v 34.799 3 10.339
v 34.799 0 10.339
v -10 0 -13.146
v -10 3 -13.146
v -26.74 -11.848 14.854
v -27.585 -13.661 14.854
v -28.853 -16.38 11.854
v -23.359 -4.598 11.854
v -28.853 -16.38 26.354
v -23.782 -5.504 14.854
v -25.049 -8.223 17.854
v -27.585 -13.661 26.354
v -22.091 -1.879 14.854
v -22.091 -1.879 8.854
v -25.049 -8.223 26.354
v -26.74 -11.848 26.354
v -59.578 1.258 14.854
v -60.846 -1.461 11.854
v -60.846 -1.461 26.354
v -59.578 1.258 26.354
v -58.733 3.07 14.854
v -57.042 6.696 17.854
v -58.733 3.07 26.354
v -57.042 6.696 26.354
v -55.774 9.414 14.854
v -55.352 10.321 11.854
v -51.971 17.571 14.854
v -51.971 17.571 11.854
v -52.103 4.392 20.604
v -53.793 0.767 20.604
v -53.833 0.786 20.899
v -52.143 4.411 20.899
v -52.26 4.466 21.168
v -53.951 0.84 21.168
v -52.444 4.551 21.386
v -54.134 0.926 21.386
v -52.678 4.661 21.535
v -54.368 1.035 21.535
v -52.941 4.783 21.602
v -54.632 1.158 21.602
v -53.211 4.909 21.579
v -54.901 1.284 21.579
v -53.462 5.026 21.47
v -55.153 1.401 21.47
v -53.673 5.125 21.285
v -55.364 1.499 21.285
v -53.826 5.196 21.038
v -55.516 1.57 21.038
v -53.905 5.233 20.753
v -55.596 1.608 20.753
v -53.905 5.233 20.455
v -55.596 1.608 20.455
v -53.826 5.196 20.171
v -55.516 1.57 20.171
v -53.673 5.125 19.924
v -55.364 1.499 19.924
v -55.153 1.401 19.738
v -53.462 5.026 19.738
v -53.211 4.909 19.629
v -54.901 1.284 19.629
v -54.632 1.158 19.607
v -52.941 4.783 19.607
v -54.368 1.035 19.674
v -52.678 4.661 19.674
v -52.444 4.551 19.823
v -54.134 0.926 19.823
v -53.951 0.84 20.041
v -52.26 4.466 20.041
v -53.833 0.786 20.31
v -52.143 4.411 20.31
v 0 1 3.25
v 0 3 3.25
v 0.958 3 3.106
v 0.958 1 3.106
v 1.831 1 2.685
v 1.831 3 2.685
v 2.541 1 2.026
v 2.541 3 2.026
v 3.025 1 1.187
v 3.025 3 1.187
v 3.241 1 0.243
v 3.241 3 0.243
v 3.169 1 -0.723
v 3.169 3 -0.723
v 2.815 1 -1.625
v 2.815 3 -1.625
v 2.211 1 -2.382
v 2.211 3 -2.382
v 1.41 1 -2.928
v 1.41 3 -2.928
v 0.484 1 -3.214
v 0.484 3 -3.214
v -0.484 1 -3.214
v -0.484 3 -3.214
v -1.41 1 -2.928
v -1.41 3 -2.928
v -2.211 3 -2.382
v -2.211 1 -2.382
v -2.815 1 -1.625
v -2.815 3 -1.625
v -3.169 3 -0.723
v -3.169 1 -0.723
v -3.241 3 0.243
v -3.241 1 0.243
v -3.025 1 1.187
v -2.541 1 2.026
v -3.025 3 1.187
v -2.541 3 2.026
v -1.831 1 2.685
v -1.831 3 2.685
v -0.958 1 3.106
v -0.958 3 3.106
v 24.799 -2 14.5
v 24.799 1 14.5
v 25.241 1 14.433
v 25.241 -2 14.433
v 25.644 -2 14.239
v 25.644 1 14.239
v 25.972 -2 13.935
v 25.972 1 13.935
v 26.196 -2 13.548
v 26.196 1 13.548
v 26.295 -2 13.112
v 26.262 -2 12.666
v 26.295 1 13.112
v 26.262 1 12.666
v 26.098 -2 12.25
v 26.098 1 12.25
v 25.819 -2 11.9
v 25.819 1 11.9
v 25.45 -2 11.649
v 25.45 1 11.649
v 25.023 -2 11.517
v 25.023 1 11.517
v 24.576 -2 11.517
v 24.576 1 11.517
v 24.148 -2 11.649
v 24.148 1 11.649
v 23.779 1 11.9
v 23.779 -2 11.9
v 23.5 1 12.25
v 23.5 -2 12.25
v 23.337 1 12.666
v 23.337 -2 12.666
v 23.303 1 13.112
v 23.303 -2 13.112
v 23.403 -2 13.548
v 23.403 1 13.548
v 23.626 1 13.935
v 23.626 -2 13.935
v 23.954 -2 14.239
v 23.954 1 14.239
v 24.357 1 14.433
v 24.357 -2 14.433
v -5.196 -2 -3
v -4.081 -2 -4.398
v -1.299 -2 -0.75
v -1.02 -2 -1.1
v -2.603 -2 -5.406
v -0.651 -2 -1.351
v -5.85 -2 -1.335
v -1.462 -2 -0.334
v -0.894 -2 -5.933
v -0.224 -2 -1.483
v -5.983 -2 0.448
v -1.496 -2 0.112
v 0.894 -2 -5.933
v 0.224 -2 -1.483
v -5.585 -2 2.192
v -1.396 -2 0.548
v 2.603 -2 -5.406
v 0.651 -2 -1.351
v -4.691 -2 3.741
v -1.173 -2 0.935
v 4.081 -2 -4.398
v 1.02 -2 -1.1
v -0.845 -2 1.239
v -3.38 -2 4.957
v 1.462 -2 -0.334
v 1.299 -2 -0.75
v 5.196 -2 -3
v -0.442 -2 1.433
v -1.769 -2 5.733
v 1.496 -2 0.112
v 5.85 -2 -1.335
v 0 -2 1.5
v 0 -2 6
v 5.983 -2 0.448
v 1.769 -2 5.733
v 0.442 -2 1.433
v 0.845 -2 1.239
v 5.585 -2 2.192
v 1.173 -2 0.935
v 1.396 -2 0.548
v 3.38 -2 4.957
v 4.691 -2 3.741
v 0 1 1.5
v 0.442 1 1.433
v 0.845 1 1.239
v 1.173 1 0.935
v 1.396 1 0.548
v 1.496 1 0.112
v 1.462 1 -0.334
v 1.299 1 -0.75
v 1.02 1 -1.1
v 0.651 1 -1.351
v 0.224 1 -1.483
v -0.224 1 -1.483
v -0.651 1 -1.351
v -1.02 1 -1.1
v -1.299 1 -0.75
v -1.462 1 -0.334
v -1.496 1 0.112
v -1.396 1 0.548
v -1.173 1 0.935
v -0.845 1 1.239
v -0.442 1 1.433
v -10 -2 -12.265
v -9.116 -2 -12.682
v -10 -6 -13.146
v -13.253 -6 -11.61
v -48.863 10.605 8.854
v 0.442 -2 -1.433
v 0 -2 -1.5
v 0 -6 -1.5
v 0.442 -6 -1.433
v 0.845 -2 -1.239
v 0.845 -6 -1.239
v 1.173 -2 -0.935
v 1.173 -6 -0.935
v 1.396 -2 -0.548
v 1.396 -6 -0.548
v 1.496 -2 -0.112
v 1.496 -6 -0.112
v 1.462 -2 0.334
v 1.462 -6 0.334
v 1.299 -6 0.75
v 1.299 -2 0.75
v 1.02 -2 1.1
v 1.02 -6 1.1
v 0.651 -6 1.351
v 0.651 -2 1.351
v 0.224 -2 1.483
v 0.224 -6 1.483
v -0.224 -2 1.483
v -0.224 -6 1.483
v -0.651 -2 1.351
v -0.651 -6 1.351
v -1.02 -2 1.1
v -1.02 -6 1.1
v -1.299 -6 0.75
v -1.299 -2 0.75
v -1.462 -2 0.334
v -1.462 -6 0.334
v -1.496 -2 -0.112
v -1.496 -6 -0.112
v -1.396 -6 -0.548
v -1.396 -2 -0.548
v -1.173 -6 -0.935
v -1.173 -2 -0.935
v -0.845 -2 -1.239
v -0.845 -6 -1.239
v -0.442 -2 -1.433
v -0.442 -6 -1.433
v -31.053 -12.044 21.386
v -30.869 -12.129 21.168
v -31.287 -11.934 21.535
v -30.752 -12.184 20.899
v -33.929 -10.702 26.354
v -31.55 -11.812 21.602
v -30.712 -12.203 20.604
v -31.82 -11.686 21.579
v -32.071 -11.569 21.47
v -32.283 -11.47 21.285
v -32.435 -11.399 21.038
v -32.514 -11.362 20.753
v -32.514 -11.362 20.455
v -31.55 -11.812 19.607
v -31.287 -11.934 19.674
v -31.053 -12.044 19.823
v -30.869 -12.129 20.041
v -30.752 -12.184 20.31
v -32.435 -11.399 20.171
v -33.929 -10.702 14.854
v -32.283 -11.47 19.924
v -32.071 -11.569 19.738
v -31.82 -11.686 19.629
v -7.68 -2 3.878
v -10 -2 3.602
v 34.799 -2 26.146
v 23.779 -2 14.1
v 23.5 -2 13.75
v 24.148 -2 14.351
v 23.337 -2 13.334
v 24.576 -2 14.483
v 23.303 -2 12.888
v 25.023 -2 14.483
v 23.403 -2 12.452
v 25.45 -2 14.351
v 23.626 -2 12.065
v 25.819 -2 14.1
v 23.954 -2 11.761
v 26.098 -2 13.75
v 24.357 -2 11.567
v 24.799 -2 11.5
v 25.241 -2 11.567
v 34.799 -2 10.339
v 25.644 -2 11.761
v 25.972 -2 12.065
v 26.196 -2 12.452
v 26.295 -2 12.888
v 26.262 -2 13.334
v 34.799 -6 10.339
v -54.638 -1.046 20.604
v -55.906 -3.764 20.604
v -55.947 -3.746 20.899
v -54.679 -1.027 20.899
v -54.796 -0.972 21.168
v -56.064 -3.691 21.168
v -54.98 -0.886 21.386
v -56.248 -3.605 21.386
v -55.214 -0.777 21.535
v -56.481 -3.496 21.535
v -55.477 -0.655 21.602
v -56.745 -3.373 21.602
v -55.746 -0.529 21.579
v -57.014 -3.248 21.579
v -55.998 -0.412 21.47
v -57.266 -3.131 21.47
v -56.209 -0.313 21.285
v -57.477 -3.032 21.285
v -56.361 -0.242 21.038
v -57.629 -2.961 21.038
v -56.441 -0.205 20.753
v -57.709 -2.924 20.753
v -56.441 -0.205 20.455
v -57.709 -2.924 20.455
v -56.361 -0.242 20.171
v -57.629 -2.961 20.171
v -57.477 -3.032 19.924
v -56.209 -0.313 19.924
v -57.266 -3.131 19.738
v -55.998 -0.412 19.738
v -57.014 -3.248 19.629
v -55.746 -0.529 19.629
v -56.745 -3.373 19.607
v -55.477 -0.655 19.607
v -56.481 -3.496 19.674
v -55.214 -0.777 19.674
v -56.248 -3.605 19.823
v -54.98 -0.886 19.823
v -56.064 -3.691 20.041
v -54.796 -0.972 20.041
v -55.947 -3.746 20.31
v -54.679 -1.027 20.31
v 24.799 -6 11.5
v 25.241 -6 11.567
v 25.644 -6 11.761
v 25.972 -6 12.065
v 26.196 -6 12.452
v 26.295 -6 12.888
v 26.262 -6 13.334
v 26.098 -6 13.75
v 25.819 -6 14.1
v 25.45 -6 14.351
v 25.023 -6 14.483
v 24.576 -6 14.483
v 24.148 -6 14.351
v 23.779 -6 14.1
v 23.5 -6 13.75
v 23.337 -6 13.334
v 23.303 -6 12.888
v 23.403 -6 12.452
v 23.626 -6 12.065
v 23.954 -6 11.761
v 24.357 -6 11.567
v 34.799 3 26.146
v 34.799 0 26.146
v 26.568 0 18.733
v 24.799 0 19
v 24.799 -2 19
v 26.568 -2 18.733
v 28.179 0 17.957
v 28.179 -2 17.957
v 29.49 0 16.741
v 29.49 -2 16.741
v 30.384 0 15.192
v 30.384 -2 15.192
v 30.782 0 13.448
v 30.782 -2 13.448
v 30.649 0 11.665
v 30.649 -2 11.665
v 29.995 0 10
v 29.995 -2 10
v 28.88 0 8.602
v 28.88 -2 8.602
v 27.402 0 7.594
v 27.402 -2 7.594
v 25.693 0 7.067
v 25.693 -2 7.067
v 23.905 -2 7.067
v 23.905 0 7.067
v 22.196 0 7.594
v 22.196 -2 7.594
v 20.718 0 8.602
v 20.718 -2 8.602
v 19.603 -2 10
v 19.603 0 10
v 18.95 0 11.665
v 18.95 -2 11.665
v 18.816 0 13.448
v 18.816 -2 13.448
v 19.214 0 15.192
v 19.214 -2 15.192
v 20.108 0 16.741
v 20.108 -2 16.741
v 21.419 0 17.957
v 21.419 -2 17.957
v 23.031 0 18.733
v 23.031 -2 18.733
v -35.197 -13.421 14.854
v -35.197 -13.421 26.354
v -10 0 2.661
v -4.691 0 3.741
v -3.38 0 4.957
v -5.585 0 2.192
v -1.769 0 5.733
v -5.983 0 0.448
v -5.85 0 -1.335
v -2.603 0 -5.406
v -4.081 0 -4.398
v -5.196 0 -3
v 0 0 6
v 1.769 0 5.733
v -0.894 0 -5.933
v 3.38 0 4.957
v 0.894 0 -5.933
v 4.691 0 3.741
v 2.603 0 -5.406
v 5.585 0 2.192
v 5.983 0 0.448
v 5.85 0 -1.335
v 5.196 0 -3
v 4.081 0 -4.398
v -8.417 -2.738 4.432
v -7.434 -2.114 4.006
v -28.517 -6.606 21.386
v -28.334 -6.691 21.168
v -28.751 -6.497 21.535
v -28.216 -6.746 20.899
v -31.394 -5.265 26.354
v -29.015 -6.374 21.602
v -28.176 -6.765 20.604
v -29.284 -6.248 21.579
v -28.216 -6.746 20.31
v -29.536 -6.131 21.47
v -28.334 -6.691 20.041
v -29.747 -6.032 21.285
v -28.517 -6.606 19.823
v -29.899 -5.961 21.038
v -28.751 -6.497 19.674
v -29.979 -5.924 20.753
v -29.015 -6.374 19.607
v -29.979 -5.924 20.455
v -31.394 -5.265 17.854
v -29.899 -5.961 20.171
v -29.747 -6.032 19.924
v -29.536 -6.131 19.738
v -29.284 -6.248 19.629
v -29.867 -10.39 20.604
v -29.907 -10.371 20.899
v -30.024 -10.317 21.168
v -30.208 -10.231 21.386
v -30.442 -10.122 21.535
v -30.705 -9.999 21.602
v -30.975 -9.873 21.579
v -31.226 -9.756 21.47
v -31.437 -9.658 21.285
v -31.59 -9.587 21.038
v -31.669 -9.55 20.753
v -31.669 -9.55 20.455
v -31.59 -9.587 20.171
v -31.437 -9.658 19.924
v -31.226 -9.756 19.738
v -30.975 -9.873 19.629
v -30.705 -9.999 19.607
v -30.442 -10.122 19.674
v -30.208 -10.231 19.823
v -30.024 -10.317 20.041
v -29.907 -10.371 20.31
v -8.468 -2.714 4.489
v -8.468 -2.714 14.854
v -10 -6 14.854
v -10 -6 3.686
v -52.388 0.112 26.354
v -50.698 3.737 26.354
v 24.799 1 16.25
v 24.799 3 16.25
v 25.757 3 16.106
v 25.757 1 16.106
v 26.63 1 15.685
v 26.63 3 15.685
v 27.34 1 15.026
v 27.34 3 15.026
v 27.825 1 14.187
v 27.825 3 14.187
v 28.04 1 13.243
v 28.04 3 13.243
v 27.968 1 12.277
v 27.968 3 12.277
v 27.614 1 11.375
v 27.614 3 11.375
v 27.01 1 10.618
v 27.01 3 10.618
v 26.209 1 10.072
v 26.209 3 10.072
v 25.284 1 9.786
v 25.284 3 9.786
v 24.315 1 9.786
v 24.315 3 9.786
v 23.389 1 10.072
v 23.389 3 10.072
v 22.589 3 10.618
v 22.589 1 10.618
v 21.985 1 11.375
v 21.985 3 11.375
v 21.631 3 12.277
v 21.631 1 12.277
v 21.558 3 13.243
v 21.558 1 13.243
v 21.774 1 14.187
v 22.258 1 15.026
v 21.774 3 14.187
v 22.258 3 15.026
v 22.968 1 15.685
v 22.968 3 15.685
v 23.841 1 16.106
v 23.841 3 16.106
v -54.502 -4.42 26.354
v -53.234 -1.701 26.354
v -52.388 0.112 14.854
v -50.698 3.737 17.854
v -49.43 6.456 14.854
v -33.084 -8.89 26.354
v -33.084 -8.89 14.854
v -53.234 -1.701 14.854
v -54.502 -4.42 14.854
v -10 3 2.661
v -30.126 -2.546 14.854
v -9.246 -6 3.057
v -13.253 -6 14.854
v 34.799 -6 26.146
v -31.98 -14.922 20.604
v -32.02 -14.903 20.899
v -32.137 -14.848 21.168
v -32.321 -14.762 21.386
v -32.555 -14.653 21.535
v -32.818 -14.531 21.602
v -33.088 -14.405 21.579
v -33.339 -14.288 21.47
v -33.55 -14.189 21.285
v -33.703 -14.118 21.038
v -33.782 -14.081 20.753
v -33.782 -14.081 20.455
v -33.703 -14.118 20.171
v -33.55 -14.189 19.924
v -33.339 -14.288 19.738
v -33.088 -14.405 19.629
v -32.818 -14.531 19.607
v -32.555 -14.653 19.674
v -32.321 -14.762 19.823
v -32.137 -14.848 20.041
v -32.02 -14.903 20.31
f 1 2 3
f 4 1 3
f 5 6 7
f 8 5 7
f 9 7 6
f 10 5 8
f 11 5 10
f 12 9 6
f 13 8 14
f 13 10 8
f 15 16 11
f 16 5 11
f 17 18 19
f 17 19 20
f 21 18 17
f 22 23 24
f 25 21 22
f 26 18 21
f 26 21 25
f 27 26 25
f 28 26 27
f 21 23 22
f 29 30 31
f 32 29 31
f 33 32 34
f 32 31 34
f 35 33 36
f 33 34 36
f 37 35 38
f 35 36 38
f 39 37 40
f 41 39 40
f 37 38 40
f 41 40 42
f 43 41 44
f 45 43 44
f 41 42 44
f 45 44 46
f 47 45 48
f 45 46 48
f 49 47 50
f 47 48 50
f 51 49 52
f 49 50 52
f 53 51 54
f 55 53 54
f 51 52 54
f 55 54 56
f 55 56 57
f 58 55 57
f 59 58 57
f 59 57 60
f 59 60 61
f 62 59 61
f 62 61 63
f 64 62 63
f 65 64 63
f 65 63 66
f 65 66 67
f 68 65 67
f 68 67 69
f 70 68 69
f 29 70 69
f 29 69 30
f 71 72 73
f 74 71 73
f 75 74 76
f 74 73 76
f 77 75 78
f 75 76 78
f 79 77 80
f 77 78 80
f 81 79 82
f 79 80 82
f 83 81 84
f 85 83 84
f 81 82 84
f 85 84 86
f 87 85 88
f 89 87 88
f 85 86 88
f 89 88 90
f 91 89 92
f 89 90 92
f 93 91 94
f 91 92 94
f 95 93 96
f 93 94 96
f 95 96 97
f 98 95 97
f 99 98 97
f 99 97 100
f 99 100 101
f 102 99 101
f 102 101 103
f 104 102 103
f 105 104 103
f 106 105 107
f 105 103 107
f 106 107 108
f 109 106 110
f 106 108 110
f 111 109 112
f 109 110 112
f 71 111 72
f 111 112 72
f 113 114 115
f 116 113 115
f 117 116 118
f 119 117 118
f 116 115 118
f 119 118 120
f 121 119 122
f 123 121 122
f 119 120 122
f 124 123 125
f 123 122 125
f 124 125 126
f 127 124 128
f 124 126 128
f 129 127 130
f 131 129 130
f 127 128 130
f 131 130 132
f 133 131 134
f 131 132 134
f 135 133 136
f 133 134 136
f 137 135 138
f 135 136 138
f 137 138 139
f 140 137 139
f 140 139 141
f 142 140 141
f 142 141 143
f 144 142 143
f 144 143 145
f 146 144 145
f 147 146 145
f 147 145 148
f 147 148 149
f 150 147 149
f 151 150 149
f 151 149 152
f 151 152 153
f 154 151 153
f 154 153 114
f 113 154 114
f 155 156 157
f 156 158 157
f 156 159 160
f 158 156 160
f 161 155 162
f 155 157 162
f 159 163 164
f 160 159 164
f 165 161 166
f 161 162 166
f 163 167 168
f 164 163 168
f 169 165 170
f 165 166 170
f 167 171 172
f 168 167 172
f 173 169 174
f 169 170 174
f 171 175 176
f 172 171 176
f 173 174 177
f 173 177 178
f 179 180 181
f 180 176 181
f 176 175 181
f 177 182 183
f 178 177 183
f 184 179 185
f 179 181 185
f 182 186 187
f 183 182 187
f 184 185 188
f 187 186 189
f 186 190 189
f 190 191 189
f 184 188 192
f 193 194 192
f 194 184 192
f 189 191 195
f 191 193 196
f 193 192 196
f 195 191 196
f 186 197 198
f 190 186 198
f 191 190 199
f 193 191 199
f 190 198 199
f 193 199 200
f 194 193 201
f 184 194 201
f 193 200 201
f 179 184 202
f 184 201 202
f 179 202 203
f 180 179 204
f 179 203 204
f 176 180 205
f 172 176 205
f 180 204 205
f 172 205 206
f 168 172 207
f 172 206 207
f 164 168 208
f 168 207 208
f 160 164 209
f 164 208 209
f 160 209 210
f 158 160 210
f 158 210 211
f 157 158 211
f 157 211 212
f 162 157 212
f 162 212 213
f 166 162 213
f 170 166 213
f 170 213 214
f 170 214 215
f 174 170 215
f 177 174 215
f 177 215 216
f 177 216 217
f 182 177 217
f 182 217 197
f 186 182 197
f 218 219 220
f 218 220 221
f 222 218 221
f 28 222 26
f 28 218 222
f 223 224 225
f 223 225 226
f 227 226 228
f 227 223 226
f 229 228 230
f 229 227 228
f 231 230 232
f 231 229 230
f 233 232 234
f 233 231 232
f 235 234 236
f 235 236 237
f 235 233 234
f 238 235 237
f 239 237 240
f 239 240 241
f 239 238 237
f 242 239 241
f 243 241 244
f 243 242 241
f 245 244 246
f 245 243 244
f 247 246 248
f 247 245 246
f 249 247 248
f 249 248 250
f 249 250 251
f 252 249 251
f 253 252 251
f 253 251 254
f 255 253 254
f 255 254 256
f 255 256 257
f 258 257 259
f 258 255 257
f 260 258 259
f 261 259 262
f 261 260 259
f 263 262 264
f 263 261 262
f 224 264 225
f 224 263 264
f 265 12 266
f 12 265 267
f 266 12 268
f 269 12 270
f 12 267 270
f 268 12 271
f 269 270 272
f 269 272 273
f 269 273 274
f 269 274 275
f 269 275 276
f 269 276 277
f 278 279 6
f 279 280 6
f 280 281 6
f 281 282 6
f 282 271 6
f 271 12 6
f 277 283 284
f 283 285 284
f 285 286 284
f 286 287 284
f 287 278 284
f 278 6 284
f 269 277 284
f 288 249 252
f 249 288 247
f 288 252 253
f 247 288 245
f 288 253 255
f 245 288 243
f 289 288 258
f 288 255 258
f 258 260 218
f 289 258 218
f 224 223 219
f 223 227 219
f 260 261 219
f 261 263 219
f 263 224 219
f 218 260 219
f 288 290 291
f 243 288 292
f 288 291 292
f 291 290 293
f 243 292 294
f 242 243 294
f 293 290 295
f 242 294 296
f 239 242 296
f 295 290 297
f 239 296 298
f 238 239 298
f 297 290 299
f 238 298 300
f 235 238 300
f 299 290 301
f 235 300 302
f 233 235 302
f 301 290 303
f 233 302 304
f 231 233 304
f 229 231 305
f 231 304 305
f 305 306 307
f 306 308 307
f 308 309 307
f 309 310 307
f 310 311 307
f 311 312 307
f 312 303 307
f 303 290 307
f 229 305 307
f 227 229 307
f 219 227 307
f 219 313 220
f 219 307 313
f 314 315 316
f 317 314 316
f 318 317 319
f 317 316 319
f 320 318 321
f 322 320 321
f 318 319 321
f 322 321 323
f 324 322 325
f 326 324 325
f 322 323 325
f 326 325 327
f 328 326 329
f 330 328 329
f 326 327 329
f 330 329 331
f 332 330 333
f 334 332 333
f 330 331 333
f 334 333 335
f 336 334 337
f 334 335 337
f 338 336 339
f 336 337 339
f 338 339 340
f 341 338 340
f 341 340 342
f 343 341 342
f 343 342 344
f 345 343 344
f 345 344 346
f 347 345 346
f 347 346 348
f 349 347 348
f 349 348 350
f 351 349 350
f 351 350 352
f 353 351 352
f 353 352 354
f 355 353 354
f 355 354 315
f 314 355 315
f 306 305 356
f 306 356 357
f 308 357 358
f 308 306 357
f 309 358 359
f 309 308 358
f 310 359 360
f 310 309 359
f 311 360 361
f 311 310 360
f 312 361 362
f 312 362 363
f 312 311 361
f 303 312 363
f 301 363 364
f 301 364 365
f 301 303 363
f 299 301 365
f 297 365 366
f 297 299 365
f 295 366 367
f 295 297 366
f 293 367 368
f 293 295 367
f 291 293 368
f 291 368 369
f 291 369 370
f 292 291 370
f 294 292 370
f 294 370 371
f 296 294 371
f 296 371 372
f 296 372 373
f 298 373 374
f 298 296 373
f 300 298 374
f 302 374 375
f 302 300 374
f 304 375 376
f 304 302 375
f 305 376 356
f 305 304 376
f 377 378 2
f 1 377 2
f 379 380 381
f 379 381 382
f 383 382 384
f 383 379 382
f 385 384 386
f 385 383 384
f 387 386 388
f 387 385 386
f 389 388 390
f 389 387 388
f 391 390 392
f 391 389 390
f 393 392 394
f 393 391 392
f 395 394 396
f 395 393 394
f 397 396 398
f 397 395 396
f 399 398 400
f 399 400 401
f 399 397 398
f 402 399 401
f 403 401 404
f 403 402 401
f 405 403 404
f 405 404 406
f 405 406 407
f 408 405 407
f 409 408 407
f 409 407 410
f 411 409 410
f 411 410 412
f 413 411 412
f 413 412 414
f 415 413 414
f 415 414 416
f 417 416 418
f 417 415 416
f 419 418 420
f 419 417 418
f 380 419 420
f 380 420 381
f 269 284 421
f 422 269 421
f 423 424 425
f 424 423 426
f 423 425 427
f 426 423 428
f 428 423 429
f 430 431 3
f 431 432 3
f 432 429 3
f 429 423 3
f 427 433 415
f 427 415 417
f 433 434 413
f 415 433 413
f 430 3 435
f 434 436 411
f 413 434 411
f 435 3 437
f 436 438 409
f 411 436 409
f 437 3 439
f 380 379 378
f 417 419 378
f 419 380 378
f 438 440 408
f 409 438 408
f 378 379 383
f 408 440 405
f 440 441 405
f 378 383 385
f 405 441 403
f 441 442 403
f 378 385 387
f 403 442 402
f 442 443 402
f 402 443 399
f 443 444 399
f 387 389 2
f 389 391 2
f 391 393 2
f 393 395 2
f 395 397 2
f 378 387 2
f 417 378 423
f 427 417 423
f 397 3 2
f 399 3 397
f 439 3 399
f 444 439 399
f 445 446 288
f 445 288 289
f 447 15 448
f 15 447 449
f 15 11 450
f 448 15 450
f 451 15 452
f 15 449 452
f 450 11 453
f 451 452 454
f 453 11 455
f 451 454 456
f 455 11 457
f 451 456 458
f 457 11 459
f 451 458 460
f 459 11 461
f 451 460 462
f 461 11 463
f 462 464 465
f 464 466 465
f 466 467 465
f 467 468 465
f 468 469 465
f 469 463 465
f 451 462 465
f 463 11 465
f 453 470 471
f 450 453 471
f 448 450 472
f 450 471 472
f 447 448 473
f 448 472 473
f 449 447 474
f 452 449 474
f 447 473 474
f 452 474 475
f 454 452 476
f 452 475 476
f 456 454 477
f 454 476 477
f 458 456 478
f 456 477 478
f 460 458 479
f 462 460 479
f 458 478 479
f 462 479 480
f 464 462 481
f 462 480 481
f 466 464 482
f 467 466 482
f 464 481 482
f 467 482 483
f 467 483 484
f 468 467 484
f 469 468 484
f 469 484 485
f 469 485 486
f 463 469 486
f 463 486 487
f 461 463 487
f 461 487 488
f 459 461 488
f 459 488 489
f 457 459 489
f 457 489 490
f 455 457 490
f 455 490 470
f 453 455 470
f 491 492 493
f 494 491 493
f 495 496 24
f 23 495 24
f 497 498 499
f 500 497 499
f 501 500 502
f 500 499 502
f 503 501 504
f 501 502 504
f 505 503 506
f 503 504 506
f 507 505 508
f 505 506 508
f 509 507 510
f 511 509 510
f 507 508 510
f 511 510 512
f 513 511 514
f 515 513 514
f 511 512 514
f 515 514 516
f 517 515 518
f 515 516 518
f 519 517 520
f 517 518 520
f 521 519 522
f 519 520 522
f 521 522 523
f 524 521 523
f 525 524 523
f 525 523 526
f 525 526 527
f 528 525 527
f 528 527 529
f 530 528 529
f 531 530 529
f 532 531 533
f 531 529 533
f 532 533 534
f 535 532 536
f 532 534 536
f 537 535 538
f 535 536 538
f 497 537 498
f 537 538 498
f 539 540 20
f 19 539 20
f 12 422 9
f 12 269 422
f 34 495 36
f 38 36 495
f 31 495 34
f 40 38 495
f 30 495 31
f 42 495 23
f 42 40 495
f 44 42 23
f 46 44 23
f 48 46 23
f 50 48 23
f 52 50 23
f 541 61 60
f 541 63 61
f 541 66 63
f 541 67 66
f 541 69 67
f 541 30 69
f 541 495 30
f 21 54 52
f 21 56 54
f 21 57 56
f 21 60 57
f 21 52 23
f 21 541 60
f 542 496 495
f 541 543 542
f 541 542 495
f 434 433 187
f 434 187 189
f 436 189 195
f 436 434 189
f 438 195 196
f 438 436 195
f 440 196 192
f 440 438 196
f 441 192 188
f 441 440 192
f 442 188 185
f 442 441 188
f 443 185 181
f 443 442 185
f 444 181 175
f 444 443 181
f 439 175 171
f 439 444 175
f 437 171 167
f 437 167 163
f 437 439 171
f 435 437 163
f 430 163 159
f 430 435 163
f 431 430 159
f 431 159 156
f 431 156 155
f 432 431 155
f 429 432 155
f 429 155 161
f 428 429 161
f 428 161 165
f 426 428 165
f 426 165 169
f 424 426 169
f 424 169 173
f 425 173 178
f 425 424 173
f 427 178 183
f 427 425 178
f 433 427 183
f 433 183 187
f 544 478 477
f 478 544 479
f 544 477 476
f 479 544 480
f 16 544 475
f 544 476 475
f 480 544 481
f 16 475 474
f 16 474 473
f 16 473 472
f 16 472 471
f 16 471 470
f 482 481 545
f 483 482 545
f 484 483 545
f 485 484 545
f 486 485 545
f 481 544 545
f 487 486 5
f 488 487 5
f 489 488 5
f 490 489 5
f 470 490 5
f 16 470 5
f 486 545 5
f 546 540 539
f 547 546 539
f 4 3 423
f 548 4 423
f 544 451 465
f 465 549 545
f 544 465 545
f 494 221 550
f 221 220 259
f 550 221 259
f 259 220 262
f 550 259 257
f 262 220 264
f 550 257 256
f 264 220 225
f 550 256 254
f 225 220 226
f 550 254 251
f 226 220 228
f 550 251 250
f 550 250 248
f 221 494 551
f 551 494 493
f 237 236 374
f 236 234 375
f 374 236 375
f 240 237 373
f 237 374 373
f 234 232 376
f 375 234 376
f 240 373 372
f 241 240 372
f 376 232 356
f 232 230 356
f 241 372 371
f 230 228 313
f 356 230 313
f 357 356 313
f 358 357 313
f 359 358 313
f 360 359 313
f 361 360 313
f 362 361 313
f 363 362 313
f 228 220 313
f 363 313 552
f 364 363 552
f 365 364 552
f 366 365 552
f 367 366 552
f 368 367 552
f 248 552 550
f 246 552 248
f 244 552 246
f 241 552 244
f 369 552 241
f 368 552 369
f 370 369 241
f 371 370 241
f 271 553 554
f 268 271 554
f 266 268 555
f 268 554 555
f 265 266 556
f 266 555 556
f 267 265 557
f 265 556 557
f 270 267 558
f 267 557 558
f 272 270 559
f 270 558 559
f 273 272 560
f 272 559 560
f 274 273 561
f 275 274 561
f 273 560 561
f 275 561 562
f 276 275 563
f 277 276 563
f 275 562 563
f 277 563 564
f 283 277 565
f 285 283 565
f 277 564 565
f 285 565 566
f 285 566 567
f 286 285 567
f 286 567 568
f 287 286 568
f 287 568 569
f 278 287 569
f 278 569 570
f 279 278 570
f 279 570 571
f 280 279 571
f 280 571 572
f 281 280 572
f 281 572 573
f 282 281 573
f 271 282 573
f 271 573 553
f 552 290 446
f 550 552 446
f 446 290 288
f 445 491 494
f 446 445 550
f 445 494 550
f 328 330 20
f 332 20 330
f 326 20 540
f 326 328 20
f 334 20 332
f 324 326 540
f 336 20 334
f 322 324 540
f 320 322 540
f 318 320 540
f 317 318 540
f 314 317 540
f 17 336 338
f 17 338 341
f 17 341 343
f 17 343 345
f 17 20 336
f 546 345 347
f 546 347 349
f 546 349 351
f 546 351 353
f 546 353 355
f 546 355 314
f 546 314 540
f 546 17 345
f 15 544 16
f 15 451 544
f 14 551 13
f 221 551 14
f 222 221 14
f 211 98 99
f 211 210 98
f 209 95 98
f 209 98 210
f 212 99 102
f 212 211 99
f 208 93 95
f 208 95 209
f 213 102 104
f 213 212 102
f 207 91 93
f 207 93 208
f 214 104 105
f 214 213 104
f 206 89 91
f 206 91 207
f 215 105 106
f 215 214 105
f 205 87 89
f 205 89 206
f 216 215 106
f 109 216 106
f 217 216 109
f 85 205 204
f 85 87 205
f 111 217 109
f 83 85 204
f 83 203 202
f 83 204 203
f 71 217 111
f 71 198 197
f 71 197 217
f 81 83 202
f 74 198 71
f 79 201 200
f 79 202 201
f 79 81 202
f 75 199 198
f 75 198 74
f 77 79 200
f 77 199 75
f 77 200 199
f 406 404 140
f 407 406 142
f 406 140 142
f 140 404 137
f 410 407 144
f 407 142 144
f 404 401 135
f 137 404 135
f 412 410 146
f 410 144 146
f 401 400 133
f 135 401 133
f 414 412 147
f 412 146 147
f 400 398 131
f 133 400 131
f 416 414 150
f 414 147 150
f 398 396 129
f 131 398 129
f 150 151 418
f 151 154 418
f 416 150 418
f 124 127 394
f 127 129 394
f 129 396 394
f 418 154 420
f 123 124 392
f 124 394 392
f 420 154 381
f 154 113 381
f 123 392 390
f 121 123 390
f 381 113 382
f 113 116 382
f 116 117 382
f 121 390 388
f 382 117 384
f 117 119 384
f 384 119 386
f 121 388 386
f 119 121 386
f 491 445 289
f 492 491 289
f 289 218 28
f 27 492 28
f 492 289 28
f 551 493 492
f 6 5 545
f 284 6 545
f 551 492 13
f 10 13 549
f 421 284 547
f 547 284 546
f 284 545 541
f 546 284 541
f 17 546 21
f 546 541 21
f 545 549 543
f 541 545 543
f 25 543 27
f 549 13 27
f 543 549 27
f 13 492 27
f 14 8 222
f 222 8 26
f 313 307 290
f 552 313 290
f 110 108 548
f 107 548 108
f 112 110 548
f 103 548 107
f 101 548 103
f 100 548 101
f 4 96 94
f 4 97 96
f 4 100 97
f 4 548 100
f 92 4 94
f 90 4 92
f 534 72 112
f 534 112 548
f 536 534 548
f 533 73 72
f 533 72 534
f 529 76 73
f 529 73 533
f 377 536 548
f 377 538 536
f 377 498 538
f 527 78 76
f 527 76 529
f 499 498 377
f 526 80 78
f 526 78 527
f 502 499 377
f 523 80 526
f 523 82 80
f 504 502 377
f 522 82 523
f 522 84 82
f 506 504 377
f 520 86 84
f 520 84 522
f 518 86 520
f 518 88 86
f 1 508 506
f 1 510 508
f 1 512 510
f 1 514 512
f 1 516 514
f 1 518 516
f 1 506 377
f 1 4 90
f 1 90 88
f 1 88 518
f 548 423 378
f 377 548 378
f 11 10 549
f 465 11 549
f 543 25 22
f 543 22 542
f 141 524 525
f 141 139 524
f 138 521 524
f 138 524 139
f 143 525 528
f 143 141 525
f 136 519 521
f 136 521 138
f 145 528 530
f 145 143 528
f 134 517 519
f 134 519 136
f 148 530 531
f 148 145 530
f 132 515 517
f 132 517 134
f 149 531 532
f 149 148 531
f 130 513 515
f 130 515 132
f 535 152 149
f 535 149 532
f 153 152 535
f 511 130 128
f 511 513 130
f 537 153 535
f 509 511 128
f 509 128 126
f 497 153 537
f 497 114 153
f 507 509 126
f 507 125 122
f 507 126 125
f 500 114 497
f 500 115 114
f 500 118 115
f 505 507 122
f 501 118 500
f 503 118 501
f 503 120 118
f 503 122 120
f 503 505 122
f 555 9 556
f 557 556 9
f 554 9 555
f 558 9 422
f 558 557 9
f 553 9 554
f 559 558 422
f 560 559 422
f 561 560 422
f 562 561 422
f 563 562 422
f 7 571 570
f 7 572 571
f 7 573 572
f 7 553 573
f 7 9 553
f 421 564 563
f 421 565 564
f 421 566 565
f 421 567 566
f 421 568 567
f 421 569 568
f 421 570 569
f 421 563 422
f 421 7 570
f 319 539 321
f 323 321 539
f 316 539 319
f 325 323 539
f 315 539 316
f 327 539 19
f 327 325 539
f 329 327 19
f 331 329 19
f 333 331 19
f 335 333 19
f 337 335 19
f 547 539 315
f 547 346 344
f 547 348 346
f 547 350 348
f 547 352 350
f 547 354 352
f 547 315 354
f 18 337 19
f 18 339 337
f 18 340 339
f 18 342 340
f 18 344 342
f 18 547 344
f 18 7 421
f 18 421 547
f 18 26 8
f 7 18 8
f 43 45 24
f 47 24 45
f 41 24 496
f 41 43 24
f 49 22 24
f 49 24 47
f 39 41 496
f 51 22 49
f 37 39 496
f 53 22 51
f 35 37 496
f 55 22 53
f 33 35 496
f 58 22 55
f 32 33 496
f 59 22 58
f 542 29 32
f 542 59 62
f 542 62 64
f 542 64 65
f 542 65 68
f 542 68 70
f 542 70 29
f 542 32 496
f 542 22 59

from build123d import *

# Parameters (mm, degrees)
BOSS_EXTRUDE1_DEPTH  = 3
SKETCH1_R            = 6
SKETCH1_R_2          = 5.999999999999998
BOSS_EXTRUDE3_DEPTH  = 2
SKETCH4_R            = 1.5000000000000013
SKETCH4_R_2          = 1.5000000000000009
CUT_EXTRUDE1_DEPTH   = 44.812962496801305
SKETCH5_R            = 3.25
SKETCH5_R_2          = 3.2500000000000004
CUT_EXTRUDE2_DEPTH   = 2
SKETCH6_R            = 1.5000000000000013
SKETCH6_R_2          = 1.5000000000000009
BOSS_EXTRUDE4_DEPTH  = 4
BOSS_EXTRUDE9_DEPTH  = 5
BOSS_EXTRUDE10_DEPTH = 3
BOSS_EXTRUDE11_DEPTH = 11.5
SKETCH24_R           = 0.9999999999999983
CUT_EXTRUDE3_DEPTH   = 71.05142175706676
CUT_EXTRUDE4_DEPTH   = 71.37296543116399
CUT_EXTRUDE5_DEPTH   = 75.00527115702536
CHAMFER2_SIZE        = 1
CHAMFER2_SIZE_2      = 0.849779112
CHAMFER2_SIZE_3      = 0.753042781
CHAMFER3_SIZE        = 48
CHAMFER3_SIZE_2      = 25
CHAMFER4_SIZE        = 3
CHAMFER5_SIZE        = 3


with BuildPart() as part:
    # Sketch3 → Boss-Extrude1 (new body)
    with BuildSketch(Plane(origin=(0, 0, 0), x_dir=(1, 0, 0), z_dir=(0, 1, 0))):
        Polygon((-10, 13.145588768291844), (-9.999999999999998, -2.66137686720019), (34.79919353527449, -26.14558876829183), (34.79919353527449, -10.33862313279981), align=None)
    extrude(amount=BOSS_EXTRUDE1_DEPTH)

    # Sketch1 → Boss-Extrude3 (add)
    with BuildSketch(Plane(origin=(0, 0, 0), x_dir=(1, 0, 0), z_dir=(0, 1, 0))):
        with Locations(Location((0, 0, 0), (0, 0, 270))):
            Circle(SKETCH1_R)
        with Locations(Location((24.79919353527449, -13.000000000000002, 0), (0, 0, 270))):
            Circle(SKETCH1_R_2)
    extrude(amount=-BOSS_EXTRUDE3_DEPTH)

    # Sketch4 → Cut-Extrude1 (cut, through all)
    with BuildSketch(Plane(origin=(0, 3, 0), x_dir=(1, 0, 0), z_dir=(0, 1, 0))):
        with Locations(Location((0, 0, 0), (0, 0, 270))):
            Circle(SKETCH4_R)
        with Locations(Location((24.79919353527449, -13.000000000000002, 0), (0, 0, 270))):
            Circle(SKETCH4_R_2)
    extrude(amount=-CUT_EXTRUDE1_DEPTH, mode=Mode.SUBTRACT)

    # Sketch5 → Cut-Extrude2 (cut)
    with BuildSketch(Plane(origin=(0, 3, 0), x_dir=(1, 0, 0), z_dir=(0, 1, 0))):
        with Locations(Location((0, 0, 0), (0, 0, 270))):
            Circle(SKETCH5_R)
        with Locations(Location((24.79919353527449, -13.000000000000002, 0), (0, 0, 270))):
            Circle(SKETCH5_R_2)
    extrude(amount=-CUT_EXTRUDE2_DEPTH, mode=Mode.SUBTRACT)


with BuildPart() as body_2:
    # Sketch6 → Boss-Extrude4 (new body)
    with BuildSketch(Plane.XZ.offset(2)):
        Polygon((-9.999999999999998, 2.66137686720019), (-10, -13.145588768291844), (34.79919353527449, 10.33862313279981), (34.79919353527449, 26.14558876829183), align=None)
        with Locations(Location((0, 0, 0), (0, 0, 270))):
            Circle(SKETCH6_R, mode=Mode.SUBTRACT)
        with Locations(Location((24.79919353527449, 13.000000000000002, 0), (0, 0, 270))):
            Circle(SKETCH6_R_2, mode=Mode.SUBTRACT)
    extrude(amount=BOSS_EXTRUDE4_DEPTH)

    # Sketch19 → Boss-Extrude9 (add)
    with BuildSketch(Plane(origin=(-2.5521063946862226, -5.473009825281398, 2.8e-16), x_dir=(0.9063077870366528, -0.42261826174069356, 0), z_dir=(0.42261826174069356, 0.9063077870366528, 0))):
        Polygon((-6.527368299922367, 13.145588768291844), (-6.5273682999223634, -14.854411231708156), (-54.52736829992237, -14.854411231708161), (-54.52736829992237, 13.145588768291844), align=None)
    extrude(amount=-BOSS_EXTRUDE9_DEPTH)

    # Sketch22 → Boss-Extrude10 (add)
    with BuildSketch(Plane.XY.offset(14.854411231708154)):
        Polygon((-51.9706848915214, 17.571251782926392), (-60.84566838807596, -1.4612117448433186), (-28.85300350568211, -16.379636384289785), (-19.97802000912756, 2.652827143479914), align=None)
    extrude(amount=-BOSS_EXTRUDE10_DEPTH)

    # Sketch23 → Boss-Extrude11 (add)
    with BuildSketch(Plane.XY.offset(14.854411231708154)):
        Polygon((-58.73257707937249, 3.0703271903399454), (-57.04210403240972, 6.695558338486558), (-50.697949523153156, 3.737230506301715), (-52.38842257011593, 0.11199935815509857), align=None)
        Polygon((-60.84566838807596, -1.4612117448433186), (-59.57781360285388, 1.2577116162666404), (-53.23365909359731, -1.7006162159182072), (-54.501513878819395, -4.419539577028165), align=None)
        Polygon((-35.19715801493865, -13.421308552104925), (-28.85300350568211, -16.379636384289785), (-27.58514872046003, -13.6607130231798), (-33.92930322971659, -10.702385190994963), align=None)
        Polygon((-33.0840667062352, -8.88976961692166), (-26.73991219697864, -11.8480974491065), (-25.049439150015868, -8.222866300959888), (-31.393593659272426, -5.264538468775042), align=None)
    extrude(amount=BOSS_EXTRUDE11_DEPTH)

    # Sketch24 → Cut-Extrude3 (cut, through all)
    with BuildSketch(Plane(origin=(-11.42708989124078, -24.505473353051112, 0), x_dir=(0.9063077870366529, -0.4226182617406931, 0), z_dir=(-0.42261826174069306, -0.9063077870366528, 0))):
        with Locations((-50.077368299922384, 20.604411231708156)):
            Circle(SKETCH24_R)
        with Locations((-23.677368299922374, 20.60441123170816)):
            Circle(SKETCH24_R)
    extrude(amount=-CUT_EXTRUDE3_DEPTH, mode=Mode.SUBTRACT)

    # Sketch25 → Cut-Extrude4 (cut, through all)
    with BuildSketch(Plane.XZ.offset(5.999999999999999)):
        Polygon((-1.7598045547698953, -8.82599101058171), (-0.856014781659975, -22.343448840083095), (-19.416391366852192, -22.343448840083095), (-12.561706832548245, 28.592130084052375), (-0.856014781659975, 28.592130084052375), align=None)
    extrude(amount=CUT_EXTRUDE4_DEPTH, mode=Mode.SUBTRACT)

    # Sketch26 → Cut-Extrude5 (cut, through all)
    with BuildSketch(Plane(origin=(3.2500000000000018, 0, -6.1997983838186235), x_dir=(-0.8856854834026603, 0, -0.46428571428571436), z_dir=(0.4642857142857144, 0, -0.8856854834026604))):
        Polygon((-2.6471574670381415, -3.4708885976233637), (-2.0453444794839015, -11.294457435868079), (36.03300455139902, -14.522363460038978), (23.996744800257375, 7.088193820427202), align=None)
    extrude(amount=CUT_EXTRUDE5_DEPTH, mode=Mode.SUBTRACT)

    # Chamfer2
    # the kernel refuses this chamfer: 1, 0.849779112, 0.753042781 mm, written as the material it adds along each edge
    with BuildSketch(Plane(origin=(-6.36268787947312, -3.696106496901656, 4.568094418300827), x_dir=(0.33809036708449836, 0.9242749779914556, 0.17723055251158967), z_dir=(-0.8186169306793458, 0.38172734387111207, -0.4291276683531757))) as chamfer2_piece_1_section:
        Polygon((CHAMFER2_SIZE, -2e-17), (CHAMFER2_SIZE_2 * 0.196215621581, -CHAMFER2_SIZE_2 * 0.980560773459), (0, 0), align=None)
    chamfer2_piece_1 = extrude(amount=7.014923756891123, mode=Mode.PRIVATE)
    chamfer2_piece_1 = split(chamfer2_piece_1, bisect_by=Plane(origin=(-6.36268787947312, -2, 4.568094418300827), z_dir=(0, -1, 0)), keep=Keep.TOP, mode=Mode.PRIVATE)
    chamfer2_piece_1 = split(chamfer2_piece_1, bisect_by=Plane(origin=(-8.46791111376206, -2.714424780626905, 4.568094418300827), z_dir=(-0.9063077870366527, 0.4226182617406935, 0)), keep=Keep.TOP, mode=Mode.PRIVATE)
    add(chamfer2_piece_1)
    with BuildSketch(Plane(origin=(-11.061112191786581, -8.275562438723423, 2.1051306137240746), x_dir=(-0.09141088767312612, -0.19603128122495278, 0.9763277044087783), z_dir=(0.4126139173265195, 0.884853401205295, 0.21629658712953703))) as chamfer2_piece_2_section:
        Polygon((CHAMFER2_SIZE, 0), (CHAMFER2_SIZE_3 * 0.420785758249, CHAMFER2_SIZE_3 * 0.907160044076), (0, 0), align=None)
    chamfer2_piece_2 = extrude(amount=8.85649542189165, mode=Mode.PRIVATE)
    chamfer2_piece_2 = split(chamfer2_piece_2, bisect_by=Plane(origin=(-11.061112191786581, -6, 2.1051306137240746), z_dir=(0, 1, 0)), keep=Keep.TOP, mode=Mode.PRIVATE)
    chamfer2_piece_2 = split(chamfer2_piece_2, bisect_by=Plane(origin=(-8.467911113762062, -2.7144247806268984, 2.105130613724074), z_dir=(-0.42261826174069356, -0.9063077870366528, 0)), keep=Keep.TOP, mode=Mode.PRIVATE)
    add(chamfer2_piece_2)
    with BuildSketch(Plane(origin=(-11.061112191786581, -8.275562438723423, 2.1051306137240746), x_dir=(-0.09141088767312612, -0.19603128122495278, 0.9763277044087783), z_dir=(0.4126139173265195, 0.884853401205295, 0.21629658712953703))) as chamfer2_piece_3a_section:
        Polygon((CHAMFER2_SIZE, 0), (CHAMFER2_SIZE_3 * 0.420785758249, CHAMFER2_SIZE_3 * 0.907160044076), (0, 0), align=None)
    chamfer2_piece_3a = extrude(amount=8.85649542189165, mode=Mode.PRIVATE)
    chamfer2_piece_3a = split(chamfer2_piece_3a, bisect_by=Plane(origin=(-11.061112191786581, -2, 2.1051306137240746), z_dir=(0, -1, 0)), keep=Keep.TOP, mode=Mode.PRIVATE)
    chamfer2_piece_3a = split(chamfer2_piece_3a, bisect_by=Plane(origin=(-8.467911113762062, -2.7144247806268993, 2.105130613724074), z_dir=(0.42261826174069356, 0.9063077870366528, 0)), keep=Keep.TOP, mode=Mode.PRIVATE)
    with BuildSketch(Plane(origin=(-6.36268787947312, -3.696106496901656, 4.568094418300827), x_dir=(0.33809036708449836, 0.9242749779914556, 0.17723055251158967), z_dir=(-0.8186169306793458, 0.38172734387111207, -0.4291276683531757))) as chamfer2_piece_3b_section:
        Polygon((CHAMFER2_SIZE, -2e-17), (CHAMFER2_SIZE_2 * 0.196215621581, -CHAMFER2_SIZE_2 * 0.980560773459), (0, 0), align=None)
    chamfer2_piece_3b = extrude(amount=7.014923756891123, mode=Mode.PRIVATE)
    chamfer2_piece_3b = split(chamfer2_piece_3b, bisect_by=Plane(origin=(-6.36268787947312, -2, 4.568094418300827), z_dir=(0, -1, 0)), keep=Keep.TOP, mode=Mode.PRIVATE)
    chamfer2_piece_3b = split(chamfer2_piece_3b, bisect_by=Plane(origin=(-8.46791111376206, -2.714424780626905, 4.568094418300827), z_dir=(0.9063077870366527, -0.4226182617406935, 0)), keep=Keep.TOP, mode=Mode.PRIVATE)
    chamfer2_piece_3 = chamfer2_piece_3a & chamfer2_piece_3b
    add(chamfer2_piece_3)

    # Chamfer3
    # the kernel refuses this chamfer: 48, 25 mm, written as the material it takes off along each edge
    with BuildSketch(Plane(origin=(0.5510317235878048, 130.20443654107186, -13.145588768291852), x_dir=(0.9063077870366527, -0.4226182617406935, 0), z_dir=(-0.4226182617406935, -0.9063077870366527, 0))) as chamfer3_piece_1:
        Polygon((CHAMFER3_SIZE, 0), (7.36e-15, CHAMFER3_SIZE_2), (0, 0), align=None)
    extrude(amount=253.55393800912003, mode=Mode.SUBTRACT)

    # Chamfer4
    chamfer4_edges = [body_2.edges().sort_by_distance(p)[0] for p in [
        (-38.08744375902795, 5.580500528019885, 11.854411231708156),
    ]]
    chamfer(chamfer4_edges, length=CHAMFER4_SIZE)

    # Chamfer5
    chamfer5_edges = [body_2.edges().sort_by_distance(p)[0] for p in [
        (-53.87002677778143, 5.216394422394137, 14.854411231708154),
        (-28.22151640464415, -6.743702384867465, 14.854411231708154),
    ]]
    chamfer(chamfer5_edges, length=CHAMFER5_SIZE)


solid = Compound([part.part, body_2.part])
